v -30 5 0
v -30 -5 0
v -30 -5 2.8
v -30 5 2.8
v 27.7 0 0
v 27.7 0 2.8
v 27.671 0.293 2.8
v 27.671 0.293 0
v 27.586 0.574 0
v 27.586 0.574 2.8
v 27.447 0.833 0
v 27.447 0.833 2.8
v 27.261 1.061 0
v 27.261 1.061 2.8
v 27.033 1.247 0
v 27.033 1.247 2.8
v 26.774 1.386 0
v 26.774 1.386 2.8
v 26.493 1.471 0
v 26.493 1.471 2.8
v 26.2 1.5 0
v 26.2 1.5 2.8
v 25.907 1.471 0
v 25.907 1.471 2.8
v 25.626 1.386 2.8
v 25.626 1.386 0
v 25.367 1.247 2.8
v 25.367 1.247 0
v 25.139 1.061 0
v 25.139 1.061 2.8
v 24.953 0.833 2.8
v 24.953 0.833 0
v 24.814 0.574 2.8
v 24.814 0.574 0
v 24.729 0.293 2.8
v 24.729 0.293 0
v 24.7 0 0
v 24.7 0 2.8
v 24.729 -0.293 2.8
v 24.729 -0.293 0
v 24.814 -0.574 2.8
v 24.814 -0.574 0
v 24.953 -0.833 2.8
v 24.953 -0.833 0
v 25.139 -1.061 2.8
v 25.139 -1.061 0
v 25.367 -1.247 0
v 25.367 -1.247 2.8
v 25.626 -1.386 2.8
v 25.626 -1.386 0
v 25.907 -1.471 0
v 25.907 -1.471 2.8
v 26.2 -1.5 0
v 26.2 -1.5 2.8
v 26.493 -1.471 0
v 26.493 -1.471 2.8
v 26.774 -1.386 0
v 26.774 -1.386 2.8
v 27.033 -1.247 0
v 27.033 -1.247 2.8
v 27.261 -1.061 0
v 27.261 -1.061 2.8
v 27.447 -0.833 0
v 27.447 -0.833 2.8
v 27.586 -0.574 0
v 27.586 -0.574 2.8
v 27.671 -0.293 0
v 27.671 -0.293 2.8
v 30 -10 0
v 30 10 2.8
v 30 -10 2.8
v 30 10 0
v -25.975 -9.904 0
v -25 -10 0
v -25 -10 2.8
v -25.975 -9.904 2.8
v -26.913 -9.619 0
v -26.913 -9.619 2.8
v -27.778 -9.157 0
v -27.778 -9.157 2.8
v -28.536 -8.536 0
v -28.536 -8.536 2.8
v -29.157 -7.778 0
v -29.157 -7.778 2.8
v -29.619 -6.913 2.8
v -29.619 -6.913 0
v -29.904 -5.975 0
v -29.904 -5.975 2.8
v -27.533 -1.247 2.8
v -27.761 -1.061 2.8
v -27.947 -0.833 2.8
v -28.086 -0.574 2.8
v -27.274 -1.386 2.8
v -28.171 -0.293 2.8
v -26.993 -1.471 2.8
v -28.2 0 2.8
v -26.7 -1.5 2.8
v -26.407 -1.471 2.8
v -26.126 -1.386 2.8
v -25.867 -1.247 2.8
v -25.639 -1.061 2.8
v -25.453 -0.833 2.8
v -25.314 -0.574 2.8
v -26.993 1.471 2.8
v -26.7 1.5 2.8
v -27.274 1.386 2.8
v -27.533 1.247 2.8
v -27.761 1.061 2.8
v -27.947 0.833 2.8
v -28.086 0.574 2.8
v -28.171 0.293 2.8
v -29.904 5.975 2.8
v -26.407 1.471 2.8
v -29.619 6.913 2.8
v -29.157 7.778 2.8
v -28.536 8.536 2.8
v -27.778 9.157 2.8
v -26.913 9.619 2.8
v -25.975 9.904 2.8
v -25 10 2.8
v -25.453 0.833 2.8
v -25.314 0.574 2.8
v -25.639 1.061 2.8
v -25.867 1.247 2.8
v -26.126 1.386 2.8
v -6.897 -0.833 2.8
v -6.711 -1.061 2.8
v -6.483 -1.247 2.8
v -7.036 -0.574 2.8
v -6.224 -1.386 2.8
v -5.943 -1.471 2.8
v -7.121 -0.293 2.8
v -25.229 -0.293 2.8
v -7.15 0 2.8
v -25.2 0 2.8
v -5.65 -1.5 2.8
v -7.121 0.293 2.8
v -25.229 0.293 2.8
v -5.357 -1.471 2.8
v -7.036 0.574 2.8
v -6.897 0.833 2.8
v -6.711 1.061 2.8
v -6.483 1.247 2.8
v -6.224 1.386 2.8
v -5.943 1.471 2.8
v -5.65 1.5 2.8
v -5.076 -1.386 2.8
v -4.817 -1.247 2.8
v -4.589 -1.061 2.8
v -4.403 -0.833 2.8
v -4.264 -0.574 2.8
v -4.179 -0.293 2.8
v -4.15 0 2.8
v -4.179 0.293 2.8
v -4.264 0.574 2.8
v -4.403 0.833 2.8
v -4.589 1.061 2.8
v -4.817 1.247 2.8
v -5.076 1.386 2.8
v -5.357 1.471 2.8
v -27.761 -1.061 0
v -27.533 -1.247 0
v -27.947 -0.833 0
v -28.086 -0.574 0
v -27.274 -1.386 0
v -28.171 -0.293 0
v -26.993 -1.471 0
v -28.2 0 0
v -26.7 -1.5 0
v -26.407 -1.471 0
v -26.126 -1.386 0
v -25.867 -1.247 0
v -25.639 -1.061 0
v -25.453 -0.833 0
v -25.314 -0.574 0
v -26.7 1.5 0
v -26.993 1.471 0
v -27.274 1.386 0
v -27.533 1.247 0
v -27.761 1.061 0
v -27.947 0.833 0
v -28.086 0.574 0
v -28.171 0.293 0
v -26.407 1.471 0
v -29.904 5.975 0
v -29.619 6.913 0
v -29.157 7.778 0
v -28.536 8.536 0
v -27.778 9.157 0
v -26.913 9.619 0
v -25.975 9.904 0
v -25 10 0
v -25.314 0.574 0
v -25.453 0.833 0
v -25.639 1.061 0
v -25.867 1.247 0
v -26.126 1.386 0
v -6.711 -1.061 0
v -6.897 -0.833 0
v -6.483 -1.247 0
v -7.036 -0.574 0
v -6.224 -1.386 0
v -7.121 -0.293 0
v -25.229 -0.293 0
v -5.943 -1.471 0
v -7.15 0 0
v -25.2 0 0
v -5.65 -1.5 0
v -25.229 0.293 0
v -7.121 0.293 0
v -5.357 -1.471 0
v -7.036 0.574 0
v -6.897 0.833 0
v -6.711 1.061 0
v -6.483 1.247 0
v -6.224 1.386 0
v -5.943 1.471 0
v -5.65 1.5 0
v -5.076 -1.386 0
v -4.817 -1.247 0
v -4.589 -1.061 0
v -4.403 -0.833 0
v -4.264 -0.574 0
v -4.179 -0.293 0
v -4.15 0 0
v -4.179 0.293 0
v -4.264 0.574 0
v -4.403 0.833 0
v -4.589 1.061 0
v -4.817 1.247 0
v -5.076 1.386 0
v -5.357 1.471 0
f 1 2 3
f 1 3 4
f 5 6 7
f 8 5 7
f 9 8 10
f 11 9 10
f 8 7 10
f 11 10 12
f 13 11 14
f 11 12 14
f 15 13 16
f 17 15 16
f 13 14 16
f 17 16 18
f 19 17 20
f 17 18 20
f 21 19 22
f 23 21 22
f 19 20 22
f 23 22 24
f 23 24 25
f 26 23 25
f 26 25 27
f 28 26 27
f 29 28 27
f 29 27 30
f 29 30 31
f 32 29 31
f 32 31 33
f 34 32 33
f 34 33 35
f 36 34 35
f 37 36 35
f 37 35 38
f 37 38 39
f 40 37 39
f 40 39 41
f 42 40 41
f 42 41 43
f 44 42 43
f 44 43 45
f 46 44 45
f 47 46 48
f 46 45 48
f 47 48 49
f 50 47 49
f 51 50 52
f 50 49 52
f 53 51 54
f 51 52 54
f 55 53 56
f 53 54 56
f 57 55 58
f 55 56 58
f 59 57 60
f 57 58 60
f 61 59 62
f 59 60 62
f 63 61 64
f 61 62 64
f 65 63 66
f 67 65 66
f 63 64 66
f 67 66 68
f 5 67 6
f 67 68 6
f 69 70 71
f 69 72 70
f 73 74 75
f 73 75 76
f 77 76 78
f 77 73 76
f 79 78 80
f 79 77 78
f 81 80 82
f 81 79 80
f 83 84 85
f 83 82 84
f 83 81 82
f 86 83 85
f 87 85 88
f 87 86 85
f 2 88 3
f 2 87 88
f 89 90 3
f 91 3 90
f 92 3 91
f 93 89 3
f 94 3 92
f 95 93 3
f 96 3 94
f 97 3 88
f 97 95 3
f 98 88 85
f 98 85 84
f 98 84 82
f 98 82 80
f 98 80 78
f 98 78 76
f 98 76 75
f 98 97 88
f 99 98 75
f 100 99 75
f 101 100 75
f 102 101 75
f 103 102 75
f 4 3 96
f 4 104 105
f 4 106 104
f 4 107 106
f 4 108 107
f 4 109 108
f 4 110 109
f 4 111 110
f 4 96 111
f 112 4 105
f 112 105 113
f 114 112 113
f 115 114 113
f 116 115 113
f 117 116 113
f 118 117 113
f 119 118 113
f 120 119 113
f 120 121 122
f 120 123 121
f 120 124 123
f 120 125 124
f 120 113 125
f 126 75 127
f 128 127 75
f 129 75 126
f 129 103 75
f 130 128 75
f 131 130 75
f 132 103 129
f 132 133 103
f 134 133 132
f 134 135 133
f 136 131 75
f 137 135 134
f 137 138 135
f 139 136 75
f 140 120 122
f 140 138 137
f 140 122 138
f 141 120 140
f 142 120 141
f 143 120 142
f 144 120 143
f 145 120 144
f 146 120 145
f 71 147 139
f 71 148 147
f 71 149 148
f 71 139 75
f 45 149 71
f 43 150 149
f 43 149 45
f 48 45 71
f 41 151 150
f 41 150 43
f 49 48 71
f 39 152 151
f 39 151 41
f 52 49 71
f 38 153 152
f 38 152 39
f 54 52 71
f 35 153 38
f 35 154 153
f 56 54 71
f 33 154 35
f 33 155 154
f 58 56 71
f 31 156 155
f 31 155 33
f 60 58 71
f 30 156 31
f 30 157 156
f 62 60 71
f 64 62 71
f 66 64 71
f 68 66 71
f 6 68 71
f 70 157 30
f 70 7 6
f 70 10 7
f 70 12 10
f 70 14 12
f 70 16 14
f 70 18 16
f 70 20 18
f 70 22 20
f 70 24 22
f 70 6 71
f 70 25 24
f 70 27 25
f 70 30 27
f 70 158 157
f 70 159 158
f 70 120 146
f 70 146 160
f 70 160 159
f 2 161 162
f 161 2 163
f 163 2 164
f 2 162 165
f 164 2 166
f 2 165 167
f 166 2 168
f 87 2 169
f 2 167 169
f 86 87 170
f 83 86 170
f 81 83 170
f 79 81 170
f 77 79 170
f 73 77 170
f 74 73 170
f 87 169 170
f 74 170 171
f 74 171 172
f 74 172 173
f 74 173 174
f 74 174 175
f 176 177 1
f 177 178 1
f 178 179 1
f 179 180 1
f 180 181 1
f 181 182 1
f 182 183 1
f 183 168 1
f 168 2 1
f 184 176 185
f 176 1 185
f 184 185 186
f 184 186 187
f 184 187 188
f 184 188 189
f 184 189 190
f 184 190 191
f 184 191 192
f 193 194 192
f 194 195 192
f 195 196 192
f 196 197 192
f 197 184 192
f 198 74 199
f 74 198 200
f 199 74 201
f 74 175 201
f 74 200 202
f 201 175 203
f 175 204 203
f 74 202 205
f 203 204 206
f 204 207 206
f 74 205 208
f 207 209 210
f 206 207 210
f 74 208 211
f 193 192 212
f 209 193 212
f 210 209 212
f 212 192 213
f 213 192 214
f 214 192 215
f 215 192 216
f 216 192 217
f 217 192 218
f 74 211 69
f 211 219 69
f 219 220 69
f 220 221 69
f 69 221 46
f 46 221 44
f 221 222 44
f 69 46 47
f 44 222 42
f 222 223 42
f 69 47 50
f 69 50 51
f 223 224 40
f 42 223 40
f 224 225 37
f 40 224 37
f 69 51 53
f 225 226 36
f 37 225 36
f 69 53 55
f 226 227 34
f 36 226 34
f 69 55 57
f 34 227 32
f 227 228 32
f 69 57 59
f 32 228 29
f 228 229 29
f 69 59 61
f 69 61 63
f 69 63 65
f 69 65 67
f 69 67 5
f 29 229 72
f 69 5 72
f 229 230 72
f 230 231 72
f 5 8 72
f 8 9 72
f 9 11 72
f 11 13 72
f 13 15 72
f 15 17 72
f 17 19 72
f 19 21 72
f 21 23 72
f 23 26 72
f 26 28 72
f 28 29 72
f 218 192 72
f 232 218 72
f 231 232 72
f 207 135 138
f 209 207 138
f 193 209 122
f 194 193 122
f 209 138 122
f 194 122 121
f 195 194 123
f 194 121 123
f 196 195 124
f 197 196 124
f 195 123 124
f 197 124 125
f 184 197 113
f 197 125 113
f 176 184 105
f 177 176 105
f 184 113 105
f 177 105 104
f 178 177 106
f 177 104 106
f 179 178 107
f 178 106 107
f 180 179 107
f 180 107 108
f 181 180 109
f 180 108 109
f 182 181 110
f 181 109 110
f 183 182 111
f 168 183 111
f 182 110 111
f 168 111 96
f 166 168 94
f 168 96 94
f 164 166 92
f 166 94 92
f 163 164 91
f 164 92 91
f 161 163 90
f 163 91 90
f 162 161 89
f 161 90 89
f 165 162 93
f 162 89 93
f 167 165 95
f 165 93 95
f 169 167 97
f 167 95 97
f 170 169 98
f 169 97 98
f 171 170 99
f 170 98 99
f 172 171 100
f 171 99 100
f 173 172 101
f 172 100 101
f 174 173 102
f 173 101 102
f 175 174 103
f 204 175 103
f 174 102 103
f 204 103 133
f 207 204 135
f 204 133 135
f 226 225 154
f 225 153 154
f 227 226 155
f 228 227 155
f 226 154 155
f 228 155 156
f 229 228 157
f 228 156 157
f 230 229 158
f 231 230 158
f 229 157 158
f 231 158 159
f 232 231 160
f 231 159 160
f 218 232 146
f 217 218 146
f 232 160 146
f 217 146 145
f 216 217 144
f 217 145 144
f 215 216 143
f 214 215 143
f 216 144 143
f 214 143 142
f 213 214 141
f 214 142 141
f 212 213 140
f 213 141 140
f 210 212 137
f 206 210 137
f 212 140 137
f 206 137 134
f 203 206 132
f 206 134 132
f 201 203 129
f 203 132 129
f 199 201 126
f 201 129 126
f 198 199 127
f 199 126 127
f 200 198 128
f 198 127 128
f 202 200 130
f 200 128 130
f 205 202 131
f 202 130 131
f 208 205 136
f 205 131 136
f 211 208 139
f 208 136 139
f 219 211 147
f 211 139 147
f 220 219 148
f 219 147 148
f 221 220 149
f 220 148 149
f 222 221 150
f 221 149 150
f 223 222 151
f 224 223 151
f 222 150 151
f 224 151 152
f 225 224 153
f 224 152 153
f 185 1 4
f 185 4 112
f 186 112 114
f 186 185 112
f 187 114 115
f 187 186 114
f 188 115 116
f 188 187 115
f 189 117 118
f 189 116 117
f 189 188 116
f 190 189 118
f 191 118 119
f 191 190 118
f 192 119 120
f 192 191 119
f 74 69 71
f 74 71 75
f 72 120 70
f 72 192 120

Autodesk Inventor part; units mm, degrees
ref_plane "YZ Plane" through (0, 0, 0) normal (1, 0, 0) x (0, 1, 0)
ref_plane "XZ Plane" through (0, 0, 0) normal (0, 1, 0) x (-1, 0, 0)
ref_plane "XY Plane" through (0, 0, 0) normal (0, 0, 1) x (1, 0, 0)
sketch "Sketch1" plane through (0, 0, 0) normal (0, 0, 1) x (1, 0, 0)
  line L0 (-43.2426, 0) -> (42.2071, 0) projected
  line L1 (0, -15.4497) -> (0, 15.4497) projected
  line L2 (-25, 10) -> (30, 10)
  line L3 (30, 10) -> (30, -10)
  line L4 (30, -10) -> (-25, -10)
  line L5 (-30, -5) -> (-30, 5)
  arc A0 (-25, 10) -> (-30, 5) centre (-25, 5) ccw
  arc A1 (-30, -5) -> (-25, -10) centre (-25, -5) ccw
  point P0 (0, 0)
  point P1 (-30, 10)
  point P2 (-30, -10)
  dimension "d0" = 60
  dimension "d1" = 20
  dimension "d2" = 30
  dimension "d3" = 10
  dimension "d6" = 5
extrude "Extrusion1" add sketch "Sketch1" along normal blind 2.8
sketch "Sketch2" plane through (0, 0, 2.8) normal (0, 0, 1) x (1, 0, 0)
  line L0 (30, 10) -> (30, -10) projected
  line L1 (-30, -5) -> (-30, 5) projected
  circle A0 centre (-26.7, 0) radius 1.5
  circle A1 centre (26.2, 0) radius 1.5
  circle A2 centre (-5.65, 0) radius 1.5
  point P0 (0, 0)
  dimension "d7" = 3
  dimension "d8" = 3
  dimension "d9" = 3.8
  dimension "d10" = 3.3
extrude "Extrusion2" cut sketch "Sketch2" against normal blind 10
equation "\"d2\" = 0.5 * d0"
equation "\"d3\" = 0.5 * d1"
properties part number "Acrylic_PitchServoSupport_2"
